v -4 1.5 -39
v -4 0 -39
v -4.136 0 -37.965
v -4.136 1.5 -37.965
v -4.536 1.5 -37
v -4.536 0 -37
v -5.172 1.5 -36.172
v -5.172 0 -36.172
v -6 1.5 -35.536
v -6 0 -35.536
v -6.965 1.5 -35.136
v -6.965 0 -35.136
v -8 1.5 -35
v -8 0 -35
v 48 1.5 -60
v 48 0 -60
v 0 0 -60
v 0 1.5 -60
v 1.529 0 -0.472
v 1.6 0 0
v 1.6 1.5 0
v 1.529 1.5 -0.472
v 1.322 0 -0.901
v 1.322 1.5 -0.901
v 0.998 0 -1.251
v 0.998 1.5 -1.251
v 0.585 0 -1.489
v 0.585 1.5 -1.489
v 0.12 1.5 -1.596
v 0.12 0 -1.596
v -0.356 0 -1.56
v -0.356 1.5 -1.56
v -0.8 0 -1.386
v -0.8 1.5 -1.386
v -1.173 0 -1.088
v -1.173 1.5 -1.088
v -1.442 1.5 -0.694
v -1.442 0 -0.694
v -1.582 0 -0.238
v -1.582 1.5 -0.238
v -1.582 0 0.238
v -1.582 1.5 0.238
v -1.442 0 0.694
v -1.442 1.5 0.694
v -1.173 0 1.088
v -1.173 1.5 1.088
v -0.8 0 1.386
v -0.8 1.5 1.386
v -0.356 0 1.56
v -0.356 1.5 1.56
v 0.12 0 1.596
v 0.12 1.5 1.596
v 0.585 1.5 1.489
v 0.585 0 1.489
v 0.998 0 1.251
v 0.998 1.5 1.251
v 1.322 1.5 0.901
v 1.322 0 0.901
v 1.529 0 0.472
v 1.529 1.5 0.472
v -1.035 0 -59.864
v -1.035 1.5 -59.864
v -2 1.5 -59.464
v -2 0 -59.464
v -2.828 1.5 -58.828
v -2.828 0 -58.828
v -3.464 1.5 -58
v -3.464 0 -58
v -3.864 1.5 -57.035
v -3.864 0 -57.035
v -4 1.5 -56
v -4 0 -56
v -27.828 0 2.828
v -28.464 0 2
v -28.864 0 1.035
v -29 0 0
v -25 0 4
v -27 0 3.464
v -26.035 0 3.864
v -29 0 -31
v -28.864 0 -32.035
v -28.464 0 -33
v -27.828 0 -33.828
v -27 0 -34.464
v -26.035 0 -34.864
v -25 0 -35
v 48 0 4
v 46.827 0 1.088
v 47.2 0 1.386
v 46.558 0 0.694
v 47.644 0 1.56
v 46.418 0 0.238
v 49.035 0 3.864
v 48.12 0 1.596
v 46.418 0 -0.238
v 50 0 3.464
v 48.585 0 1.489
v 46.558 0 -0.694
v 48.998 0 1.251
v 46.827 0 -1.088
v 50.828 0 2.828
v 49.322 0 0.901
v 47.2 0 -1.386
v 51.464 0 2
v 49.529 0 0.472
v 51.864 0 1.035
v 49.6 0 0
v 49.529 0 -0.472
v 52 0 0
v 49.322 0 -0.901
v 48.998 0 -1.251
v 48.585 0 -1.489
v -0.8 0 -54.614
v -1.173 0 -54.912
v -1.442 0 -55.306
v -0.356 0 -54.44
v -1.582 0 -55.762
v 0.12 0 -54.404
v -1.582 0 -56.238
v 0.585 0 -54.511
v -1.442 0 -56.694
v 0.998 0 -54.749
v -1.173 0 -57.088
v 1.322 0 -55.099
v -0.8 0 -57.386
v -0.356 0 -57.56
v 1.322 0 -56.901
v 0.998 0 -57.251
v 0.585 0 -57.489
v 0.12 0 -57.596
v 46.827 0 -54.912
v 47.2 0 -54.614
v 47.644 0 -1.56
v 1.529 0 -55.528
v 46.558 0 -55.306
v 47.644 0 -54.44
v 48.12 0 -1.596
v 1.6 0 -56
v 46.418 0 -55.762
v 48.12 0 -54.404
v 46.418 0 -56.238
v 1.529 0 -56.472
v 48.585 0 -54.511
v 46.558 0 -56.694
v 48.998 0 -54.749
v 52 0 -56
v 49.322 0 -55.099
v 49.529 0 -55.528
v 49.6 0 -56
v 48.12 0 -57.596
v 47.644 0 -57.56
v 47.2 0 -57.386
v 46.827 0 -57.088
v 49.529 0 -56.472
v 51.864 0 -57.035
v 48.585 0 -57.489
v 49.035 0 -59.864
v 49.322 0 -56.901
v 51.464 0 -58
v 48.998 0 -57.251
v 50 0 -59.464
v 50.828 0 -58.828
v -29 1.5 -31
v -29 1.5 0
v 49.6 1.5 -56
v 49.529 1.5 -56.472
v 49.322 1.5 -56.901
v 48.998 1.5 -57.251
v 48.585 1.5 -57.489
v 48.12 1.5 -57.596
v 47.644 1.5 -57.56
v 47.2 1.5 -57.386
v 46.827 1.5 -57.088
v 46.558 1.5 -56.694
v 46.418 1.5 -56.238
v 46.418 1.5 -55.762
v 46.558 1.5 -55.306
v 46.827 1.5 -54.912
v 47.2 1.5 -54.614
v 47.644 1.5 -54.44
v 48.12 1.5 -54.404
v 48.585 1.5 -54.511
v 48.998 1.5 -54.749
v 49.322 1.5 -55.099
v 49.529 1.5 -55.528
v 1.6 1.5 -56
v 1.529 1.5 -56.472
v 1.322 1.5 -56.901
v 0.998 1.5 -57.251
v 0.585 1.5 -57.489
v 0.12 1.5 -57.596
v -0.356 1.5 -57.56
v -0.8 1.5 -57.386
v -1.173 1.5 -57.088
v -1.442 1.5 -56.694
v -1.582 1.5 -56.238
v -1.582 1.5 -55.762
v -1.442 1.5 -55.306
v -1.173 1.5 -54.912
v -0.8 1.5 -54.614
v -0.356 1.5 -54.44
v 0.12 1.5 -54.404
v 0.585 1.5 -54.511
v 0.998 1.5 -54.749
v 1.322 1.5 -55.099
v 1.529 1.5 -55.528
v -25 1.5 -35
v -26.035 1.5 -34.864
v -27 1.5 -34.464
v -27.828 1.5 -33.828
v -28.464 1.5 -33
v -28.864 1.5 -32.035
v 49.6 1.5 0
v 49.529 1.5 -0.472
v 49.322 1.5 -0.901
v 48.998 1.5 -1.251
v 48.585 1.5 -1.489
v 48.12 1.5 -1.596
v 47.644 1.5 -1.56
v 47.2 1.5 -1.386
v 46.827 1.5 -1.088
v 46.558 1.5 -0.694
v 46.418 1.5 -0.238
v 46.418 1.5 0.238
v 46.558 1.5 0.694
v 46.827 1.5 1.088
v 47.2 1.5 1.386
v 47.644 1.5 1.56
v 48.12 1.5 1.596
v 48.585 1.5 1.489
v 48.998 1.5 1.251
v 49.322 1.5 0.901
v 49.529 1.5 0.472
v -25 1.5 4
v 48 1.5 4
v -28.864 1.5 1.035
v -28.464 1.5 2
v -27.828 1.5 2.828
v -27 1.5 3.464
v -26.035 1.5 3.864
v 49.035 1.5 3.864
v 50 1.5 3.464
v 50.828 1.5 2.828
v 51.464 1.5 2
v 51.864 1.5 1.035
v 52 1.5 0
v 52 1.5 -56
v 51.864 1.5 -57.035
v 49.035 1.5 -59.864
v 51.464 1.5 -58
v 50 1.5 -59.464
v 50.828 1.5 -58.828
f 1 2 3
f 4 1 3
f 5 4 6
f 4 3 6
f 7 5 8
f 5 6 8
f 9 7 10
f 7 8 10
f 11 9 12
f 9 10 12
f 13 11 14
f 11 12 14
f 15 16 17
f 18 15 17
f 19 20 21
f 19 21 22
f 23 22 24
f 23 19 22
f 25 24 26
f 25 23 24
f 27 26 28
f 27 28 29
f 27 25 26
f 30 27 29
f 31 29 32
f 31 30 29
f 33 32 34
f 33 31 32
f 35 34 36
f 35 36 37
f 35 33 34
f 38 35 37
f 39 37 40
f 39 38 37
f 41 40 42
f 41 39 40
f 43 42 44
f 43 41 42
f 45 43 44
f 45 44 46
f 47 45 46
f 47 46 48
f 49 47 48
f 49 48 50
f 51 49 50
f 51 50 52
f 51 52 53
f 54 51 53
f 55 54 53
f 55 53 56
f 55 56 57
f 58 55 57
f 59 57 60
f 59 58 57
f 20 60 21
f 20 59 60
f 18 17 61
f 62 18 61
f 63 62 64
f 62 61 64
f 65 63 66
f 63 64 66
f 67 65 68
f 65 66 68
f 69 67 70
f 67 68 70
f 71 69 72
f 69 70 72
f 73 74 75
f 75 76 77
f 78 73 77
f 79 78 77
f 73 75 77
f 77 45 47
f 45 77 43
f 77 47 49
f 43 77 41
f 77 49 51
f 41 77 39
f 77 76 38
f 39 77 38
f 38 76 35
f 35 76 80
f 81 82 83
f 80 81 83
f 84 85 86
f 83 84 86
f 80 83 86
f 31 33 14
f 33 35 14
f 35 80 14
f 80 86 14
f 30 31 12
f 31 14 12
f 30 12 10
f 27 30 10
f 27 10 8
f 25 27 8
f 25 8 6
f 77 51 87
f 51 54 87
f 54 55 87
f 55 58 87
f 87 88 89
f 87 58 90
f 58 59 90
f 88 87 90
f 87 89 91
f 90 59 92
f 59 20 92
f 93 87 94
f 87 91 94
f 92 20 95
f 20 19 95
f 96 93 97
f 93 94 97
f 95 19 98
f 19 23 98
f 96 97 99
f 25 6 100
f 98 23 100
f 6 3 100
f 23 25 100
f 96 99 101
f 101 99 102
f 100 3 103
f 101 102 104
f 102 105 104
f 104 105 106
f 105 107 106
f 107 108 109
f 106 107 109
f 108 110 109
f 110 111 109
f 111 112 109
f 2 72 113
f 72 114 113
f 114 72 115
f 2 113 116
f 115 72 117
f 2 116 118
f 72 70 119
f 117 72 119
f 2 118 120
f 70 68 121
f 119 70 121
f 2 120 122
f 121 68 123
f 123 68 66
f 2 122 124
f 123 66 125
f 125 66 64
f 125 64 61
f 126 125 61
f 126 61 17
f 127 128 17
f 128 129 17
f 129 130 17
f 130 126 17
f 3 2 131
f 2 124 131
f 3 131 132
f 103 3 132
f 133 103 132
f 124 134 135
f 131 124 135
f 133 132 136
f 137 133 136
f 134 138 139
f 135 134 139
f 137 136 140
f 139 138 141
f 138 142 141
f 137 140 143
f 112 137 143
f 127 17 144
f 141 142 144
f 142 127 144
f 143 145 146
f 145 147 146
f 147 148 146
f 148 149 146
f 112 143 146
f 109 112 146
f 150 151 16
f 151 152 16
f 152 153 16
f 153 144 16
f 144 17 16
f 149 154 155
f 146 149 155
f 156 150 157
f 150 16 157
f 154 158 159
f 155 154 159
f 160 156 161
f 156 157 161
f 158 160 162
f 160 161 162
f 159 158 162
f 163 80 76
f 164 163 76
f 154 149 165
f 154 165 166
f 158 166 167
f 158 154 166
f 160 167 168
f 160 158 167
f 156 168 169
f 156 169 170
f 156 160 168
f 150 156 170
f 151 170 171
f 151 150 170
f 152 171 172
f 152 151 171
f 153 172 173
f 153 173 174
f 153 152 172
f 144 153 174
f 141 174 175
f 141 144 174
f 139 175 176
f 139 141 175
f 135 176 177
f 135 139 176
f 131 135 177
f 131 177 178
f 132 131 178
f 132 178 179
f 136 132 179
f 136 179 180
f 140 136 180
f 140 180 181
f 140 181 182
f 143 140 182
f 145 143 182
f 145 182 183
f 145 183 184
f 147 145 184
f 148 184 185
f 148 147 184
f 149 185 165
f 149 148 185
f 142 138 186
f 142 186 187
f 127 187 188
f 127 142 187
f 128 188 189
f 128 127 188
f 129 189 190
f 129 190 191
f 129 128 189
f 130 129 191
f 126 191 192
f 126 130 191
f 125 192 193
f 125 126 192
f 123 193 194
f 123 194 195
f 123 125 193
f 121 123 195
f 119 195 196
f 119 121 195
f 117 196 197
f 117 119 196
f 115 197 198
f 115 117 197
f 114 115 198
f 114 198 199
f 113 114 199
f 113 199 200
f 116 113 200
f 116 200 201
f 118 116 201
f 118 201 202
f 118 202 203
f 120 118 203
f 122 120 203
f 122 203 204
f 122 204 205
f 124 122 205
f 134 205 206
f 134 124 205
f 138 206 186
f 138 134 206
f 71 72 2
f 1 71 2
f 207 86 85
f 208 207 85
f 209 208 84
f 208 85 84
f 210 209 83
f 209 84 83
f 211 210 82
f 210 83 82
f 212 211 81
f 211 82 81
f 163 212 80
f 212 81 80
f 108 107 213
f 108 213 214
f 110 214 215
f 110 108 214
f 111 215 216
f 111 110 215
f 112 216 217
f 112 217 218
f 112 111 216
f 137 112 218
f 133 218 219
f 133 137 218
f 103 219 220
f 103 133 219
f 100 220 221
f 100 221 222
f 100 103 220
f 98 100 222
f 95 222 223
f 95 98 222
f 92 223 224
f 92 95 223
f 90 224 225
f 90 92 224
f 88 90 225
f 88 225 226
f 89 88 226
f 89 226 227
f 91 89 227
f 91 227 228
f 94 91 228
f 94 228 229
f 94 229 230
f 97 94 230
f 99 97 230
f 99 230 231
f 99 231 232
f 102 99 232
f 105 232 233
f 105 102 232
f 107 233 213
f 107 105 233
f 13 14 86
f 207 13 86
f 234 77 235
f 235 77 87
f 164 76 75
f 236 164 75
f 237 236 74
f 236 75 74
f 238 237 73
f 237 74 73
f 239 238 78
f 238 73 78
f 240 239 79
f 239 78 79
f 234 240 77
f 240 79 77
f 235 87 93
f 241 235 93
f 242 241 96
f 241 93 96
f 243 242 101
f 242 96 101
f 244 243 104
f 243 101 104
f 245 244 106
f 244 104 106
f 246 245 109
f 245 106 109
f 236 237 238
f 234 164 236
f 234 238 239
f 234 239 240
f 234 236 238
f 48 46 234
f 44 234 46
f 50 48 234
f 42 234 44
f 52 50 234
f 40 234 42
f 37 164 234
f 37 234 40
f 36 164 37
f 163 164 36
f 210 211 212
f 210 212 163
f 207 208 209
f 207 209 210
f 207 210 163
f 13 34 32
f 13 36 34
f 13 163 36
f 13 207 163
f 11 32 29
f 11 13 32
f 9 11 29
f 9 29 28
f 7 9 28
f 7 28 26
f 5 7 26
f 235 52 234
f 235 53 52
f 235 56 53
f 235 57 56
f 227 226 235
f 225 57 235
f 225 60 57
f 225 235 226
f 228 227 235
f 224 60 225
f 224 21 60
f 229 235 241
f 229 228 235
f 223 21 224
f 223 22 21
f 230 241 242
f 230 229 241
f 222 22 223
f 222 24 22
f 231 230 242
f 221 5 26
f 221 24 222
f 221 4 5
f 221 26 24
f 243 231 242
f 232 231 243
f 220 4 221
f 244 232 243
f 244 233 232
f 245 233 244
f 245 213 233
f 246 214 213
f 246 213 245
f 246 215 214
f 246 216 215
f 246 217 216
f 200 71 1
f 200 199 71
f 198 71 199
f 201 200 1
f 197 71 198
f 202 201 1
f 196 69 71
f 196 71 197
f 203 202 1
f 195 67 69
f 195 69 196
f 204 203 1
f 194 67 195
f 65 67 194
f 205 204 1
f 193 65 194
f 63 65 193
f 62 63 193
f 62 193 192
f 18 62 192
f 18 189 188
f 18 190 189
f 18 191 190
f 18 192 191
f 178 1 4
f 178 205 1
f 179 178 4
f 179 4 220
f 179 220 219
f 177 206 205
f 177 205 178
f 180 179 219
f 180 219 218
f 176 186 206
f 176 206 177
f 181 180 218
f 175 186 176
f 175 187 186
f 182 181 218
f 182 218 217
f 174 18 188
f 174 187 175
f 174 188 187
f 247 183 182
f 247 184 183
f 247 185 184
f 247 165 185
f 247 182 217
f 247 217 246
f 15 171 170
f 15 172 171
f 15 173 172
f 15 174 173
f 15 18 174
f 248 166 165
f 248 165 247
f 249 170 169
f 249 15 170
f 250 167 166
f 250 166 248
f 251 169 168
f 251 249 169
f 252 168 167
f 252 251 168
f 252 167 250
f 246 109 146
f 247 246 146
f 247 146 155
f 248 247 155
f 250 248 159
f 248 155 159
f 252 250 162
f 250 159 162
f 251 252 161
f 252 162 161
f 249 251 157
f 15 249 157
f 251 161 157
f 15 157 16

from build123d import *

# Parameters (mm, degrees)
SKETCH1_R           = 1.6
BOSS_EXTRUDE1_DEPTH = 1.5


with BuildPart() as part:
    # Sketch1 → Boss-Extrude1 (new body)
    with BuildSketch(Plane(origin=(0, 0, 0), x_dir=(1, 0, 0), z_dir=(0, 1, 0))):
        with BuildLine():
            Line((-8, 35), (-25, 35))
            ThreePointArc((-25, 35), (-27.828427125, 33.828427125), (-29, 31))
            Line((-29, 31), (-29, 0))
            ThreePointArc((-29, 0), (-27.828427125, -2.828427125), (-25, -4))
            Line((-25, -4), (-8, -4))
            Line((-8, -4), (48, -4))
            ThreePointArc((48, -4), (50.828427125, -2.828427125), (52, 0))
            Line((52, 0), (52, 56))
            ThreePointArc((52, 56), (50.828427125, 58.828427125), (48, 60))
            Line((48, 60), (0, 60))
            ThreePointArc((0, 60), (-2.828427125, 58.828427125), (-4, 56))
            Line((-4, 56), (-4, 39))
            ThreePointArc((-4, 39), (-5.171572875, 36.171572875), (-8, 35))
        make_face()
        with Locations((0, 56)):
            Circle(SKETCH1_R, mode=Mode.SUBTRACT)
        with Locations((48, 56)):
            Circle(SKETCH1_R, mode=Mode.SUBTRACT)
        with Locations((48, 0)):
            Circle(SKETCH1_R, mode=Mode.SUBTRACT)
        Circle(SKETCH1_R, mode=Mode.SUBTRACT)
    extrude(amount=BOSS_EXTRUDE1_DEPTH)


solid = part.part
